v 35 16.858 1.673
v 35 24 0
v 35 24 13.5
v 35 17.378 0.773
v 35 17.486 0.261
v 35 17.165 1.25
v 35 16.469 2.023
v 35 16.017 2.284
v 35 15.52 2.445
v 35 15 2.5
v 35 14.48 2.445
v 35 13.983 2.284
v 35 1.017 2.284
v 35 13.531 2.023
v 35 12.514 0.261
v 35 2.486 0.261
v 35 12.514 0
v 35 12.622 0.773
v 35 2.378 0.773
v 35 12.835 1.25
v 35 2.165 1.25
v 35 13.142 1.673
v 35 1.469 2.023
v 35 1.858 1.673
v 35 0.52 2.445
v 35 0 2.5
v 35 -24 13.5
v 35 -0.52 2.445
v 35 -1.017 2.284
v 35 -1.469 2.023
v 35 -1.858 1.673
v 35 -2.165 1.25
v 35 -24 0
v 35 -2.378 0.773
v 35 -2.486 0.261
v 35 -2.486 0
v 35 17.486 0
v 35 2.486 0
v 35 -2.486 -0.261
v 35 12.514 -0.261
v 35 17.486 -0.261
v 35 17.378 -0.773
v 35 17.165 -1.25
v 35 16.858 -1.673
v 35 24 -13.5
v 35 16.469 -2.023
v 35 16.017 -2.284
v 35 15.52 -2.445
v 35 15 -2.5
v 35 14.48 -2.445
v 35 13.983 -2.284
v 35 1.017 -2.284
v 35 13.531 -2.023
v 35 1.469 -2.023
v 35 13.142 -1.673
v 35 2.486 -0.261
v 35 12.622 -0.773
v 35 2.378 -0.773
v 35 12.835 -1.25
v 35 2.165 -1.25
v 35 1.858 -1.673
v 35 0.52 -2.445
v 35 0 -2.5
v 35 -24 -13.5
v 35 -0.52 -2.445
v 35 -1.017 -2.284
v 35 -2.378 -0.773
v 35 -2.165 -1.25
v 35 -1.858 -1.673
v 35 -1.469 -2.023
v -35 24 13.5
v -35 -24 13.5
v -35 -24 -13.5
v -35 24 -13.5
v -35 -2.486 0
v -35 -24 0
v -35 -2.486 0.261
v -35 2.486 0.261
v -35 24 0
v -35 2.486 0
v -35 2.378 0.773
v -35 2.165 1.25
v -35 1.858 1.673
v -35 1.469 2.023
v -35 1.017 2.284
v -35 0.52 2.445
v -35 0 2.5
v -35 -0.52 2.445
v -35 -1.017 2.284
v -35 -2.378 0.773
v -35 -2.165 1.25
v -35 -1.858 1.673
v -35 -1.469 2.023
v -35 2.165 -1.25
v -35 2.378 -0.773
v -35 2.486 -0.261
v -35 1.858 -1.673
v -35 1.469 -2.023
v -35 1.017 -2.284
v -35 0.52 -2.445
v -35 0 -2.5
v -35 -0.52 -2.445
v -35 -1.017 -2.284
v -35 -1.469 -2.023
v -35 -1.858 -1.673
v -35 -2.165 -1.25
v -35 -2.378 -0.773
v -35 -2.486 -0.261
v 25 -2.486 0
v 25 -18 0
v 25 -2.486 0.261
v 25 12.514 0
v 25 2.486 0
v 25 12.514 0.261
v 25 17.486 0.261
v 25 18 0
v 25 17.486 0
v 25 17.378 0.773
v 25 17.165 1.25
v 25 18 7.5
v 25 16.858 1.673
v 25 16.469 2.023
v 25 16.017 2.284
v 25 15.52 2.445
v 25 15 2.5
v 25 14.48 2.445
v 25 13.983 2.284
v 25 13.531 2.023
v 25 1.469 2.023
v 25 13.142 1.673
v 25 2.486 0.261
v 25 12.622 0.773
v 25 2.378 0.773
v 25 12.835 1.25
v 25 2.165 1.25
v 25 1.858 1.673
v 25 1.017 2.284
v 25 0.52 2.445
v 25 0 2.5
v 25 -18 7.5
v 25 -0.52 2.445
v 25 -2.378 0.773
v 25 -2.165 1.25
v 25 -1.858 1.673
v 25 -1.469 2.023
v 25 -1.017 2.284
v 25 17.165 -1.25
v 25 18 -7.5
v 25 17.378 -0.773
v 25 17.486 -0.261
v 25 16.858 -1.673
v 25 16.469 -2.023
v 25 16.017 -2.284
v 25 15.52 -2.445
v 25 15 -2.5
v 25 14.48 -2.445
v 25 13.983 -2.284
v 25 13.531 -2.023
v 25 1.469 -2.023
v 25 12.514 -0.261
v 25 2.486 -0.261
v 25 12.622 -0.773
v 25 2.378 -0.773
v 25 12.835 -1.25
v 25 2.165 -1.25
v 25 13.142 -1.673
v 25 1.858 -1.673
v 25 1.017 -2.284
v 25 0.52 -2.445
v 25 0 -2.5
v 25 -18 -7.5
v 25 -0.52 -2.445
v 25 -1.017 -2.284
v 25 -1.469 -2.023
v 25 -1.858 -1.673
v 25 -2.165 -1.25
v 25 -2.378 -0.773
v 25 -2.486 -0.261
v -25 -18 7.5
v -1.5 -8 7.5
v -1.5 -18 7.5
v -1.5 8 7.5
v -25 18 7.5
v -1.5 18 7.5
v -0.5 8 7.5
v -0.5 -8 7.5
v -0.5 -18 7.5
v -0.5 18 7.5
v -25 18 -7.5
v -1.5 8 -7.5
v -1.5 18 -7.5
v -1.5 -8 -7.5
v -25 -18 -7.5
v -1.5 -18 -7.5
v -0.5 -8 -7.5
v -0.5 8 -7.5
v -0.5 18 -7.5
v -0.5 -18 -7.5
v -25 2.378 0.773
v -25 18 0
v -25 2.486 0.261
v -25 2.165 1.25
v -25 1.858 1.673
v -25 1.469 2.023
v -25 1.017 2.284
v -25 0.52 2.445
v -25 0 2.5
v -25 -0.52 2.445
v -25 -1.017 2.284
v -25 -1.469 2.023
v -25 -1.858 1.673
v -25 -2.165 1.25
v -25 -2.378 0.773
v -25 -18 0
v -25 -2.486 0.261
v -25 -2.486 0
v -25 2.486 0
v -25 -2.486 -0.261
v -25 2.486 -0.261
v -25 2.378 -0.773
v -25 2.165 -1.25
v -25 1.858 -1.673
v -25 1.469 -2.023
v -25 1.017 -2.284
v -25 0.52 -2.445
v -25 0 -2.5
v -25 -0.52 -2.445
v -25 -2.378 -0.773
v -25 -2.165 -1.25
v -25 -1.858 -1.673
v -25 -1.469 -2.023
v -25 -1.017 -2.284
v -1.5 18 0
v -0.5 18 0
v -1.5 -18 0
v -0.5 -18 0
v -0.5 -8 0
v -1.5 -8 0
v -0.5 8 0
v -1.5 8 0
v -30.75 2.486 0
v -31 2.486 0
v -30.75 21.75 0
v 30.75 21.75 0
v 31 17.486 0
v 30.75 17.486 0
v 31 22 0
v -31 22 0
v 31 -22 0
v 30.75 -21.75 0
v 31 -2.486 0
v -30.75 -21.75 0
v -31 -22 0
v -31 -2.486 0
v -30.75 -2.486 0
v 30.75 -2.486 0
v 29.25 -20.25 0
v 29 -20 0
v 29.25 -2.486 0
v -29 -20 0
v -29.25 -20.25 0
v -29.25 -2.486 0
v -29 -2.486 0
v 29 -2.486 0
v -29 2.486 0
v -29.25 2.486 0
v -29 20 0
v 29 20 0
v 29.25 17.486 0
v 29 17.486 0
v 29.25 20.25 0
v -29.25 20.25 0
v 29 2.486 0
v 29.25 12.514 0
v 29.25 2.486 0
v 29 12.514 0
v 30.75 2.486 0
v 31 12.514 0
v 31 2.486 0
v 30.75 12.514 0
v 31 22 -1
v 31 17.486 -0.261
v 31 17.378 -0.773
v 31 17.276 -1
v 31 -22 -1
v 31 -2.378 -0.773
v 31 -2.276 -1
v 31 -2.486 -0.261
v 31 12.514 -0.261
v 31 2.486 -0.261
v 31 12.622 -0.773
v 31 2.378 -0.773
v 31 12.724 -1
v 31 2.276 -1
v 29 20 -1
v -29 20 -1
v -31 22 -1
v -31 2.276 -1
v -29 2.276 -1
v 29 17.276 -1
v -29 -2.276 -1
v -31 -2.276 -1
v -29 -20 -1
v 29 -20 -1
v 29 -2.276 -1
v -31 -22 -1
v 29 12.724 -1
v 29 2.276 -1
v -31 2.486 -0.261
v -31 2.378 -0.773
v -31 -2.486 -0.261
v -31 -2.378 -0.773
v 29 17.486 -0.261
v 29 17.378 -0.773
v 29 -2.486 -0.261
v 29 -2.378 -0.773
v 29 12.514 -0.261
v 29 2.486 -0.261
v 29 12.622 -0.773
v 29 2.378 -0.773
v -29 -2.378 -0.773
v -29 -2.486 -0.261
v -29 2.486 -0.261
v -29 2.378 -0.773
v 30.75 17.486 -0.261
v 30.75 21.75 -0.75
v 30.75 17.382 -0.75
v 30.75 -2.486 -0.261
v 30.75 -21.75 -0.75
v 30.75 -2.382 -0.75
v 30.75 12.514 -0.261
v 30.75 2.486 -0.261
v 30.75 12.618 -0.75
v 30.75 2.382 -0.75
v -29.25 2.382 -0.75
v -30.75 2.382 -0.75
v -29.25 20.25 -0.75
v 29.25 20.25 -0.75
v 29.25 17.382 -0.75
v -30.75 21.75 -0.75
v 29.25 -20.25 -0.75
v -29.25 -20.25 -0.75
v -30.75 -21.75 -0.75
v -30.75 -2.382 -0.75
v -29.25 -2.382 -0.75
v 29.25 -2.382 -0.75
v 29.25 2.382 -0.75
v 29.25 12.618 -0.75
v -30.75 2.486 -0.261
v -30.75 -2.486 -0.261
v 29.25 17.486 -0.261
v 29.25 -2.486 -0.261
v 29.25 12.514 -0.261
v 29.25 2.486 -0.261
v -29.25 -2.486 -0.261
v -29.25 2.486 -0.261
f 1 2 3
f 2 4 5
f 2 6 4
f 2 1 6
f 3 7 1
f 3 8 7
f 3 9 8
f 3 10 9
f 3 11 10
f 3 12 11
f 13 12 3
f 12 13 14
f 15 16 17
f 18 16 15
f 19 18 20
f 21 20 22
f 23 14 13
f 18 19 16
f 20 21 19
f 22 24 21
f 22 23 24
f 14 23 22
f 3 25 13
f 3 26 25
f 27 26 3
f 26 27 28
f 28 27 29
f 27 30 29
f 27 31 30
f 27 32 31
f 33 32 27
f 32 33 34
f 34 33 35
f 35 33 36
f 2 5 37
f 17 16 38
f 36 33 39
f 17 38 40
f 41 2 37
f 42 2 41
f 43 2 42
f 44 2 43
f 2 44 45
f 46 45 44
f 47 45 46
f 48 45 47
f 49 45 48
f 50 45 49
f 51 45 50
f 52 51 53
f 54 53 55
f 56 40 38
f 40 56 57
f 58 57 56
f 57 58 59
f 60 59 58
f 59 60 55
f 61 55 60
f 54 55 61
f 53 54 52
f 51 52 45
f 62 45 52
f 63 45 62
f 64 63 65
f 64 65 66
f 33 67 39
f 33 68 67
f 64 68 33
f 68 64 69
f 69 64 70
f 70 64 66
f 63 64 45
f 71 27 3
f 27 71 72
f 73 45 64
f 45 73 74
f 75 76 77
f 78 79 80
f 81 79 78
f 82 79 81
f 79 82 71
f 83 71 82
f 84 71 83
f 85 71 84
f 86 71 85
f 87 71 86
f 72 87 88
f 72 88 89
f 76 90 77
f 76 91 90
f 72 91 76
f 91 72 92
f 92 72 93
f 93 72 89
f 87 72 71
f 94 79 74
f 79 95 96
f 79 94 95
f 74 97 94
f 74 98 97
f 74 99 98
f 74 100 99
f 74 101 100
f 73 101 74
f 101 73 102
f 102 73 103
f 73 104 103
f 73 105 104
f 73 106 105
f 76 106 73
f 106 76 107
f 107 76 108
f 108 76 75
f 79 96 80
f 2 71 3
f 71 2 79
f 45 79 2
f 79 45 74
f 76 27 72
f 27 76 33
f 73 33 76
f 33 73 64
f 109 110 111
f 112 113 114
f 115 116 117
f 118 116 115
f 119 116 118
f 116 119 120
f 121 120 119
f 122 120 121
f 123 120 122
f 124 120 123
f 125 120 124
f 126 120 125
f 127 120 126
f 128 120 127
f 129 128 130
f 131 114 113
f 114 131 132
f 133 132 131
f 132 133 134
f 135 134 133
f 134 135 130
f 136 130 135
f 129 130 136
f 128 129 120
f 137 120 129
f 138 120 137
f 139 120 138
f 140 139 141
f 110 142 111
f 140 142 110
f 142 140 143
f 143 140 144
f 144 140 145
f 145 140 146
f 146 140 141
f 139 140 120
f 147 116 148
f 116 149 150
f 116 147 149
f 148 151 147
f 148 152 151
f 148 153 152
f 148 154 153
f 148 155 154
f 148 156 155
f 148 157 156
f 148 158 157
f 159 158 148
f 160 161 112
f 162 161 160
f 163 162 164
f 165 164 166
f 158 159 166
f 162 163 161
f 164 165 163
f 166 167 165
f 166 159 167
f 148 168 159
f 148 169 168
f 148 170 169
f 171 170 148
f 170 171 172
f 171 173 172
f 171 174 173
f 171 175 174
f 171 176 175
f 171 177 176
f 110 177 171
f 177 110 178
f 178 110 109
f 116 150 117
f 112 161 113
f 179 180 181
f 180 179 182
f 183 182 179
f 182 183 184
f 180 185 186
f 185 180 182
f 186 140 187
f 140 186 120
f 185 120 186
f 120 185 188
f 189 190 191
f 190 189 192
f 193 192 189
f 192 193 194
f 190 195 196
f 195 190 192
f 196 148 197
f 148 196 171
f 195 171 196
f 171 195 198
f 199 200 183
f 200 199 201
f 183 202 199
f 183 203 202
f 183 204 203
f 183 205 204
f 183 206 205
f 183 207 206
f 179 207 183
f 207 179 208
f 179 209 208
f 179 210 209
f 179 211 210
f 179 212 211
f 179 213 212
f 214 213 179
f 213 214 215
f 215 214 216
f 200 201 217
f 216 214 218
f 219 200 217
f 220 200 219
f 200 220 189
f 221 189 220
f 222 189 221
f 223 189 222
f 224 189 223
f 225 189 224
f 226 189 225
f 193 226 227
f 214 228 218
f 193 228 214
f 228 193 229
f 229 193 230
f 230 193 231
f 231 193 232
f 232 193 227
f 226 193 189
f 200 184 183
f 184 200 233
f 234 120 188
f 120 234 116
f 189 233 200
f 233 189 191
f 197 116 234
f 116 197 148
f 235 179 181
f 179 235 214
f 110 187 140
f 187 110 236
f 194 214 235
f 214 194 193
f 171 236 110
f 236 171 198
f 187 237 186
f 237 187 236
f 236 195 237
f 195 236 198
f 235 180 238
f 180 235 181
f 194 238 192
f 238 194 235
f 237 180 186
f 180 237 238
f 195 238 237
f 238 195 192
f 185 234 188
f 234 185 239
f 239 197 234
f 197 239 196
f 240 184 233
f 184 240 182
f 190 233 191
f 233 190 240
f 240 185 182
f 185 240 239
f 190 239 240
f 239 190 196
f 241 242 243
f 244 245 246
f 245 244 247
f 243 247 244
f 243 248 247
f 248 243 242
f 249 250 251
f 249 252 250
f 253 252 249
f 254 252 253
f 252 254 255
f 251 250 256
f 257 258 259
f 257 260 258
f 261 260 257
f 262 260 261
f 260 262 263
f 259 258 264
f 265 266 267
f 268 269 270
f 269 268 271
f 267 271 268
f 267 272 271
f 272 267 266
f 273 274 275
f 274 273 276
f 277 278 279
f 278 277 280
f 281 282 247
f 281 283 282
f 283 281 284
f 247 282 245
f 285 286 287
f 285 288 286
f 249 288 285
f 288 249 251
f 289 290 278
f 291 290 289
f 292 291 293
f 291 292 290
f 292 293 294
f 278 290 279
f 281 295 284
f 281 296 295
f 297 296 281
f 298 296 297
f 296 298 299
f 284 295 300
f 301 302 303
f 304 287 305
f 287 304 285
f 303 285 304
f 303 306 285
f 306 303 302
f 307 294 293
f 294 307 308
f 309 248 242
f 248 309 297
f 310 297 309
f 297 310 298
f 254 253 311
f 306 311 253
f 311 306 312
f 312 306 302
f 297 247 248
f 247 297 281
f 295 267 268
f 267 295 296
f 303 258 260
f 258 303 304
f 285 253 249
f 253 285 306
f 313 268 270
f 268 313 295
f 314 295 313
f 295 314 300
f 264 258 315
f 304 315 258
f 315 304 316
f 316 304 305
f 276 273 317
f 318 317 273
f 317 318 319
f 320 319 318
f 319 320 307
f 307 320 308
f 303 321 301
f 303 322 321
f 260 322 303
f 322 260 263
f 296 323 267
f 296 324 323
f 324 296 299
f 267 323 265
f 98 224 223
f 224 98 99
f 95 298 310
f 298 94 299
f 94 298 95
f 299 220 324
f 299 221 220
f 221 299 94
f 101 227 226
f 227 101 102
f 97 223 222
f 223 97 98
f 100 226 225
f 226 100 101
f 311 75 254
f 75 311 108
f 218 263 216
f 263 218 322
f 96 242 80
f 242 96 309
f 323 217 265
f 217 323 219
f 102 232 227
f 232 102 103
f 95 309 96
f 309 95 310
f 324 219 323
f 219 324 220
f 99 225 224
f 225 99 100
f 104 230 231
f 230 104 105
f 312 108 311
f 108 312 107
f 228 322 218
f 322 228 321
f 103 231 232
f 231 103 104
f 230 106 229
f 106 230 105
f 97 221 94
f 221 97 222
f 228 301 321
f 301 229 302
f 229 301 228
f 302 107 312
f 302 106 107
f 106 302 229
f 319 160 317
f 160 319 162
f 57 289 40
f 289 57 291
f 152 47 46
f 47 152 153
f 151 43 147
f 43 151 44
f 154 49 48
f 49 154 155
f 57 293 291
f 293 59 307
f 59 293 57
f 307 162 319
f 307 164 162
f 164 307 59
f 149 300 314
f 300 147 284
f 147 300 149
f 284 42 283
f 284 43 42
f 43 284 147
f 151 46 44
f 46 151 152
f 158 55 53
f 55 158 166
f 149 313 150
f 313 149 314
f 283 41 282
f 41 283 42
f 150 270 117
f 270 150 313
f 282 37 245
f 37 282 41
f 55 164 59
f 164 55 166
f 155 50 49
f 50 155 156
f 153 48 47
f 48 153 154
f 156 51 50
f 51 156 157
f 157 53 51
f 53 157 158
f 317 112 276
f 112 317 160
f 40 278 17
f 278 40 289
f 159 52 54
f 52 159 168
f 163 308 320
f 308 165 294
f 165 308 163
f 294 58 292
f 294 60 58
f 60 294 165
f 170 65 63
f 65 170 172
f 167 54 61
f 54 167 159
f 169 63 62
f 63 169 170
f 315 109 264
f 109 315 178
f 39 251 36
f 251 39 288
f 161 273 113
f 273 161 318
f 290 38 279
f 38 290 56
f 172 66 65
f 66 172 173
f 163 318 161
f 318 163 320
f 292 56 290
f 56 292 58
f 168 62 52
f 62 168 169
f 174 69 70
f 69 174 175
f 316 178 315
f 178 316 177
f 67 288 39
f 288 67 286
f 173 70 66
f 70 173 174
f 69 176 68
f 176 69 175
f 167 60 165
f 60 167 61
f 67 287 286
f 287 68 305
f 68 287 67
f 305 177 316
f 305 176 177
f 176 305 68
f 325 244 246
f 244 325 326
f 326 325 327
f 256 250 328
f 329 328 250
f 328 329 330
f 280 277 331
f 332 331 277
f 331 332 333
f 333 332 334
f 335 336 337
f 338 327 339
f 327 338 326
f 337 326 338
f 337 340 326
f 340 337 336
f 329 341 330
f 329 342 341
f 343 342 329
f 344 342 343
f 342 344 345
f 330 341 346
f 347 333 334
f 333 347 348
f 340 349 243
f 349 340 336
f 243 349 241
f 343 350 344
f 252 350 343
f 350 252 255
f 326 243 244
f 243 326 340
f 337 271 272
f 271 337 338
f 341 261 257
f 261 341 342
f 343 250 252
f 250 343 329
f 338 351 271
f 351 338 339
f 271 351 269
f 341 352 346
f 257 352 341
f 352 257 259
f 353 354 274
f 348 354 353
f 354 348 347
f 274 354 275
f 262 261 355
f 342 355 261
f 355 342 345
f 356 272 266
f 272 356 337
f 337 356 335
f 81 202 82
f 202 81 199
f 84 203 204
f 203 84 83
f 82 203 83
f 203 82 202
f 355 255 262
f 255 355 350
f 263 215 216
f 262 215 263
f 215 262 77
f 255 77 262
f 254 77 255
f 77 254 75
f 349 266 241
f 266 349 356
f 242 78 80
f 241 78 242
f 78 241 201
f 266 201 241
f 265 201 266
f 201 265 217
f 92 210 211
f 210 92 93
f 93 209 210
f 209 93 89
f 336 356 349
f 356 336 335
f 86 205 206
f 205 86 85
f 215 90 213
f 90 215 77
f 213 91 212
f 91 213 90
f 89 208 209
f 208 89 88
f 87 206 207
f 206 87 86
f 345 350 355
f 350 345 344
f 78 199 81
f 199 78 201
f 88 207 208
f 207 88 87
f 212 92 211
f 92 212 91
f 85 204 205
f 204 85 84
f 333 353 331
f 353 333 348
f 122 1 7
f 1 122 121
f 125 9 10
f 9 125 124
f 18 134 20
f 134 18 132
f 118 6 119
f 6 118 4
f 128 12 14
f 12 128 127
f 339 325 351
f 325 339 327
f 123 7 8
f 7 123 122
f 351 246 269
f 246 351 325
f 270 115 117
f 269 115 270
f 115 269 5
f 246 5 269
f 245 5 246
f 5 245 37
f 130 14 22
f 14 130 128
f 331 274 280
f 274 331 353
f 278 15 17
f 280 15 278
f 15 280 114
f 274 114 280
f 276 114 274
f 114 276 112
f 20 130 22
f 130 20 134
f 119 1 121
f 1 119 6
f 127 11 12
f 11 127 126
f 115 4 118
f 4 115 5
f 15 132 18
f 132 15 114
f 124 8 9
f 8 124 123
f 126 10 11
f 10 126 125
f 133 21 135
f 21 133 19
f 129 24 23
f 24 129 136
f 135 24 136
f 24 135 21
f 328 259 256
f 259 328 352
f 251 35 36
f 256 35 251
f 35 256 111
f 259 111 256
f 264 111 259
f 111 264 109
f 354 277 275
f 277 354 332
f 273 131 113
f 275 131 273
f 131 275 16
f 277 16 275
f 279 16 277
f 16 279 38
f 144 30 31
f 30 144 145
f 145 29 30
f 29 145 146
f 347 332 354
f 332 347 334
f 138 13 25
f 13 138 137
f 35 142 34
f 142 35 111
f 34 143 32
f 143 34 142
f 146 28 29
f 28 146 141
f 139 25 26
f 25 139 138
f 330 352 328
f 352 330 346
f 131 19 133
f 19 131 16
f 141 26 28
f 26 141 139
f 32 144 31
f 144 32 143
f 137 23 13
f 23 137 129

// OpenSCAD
module sensor() {
    color("SandyBrown")
    cube([40,16,10], center = true);
}


module cavity() {
    color("SandyBrown")
    cube([40+10,16+20,10+5], center = true);
}

module shell() {
    color("SandyBrown")
    cube([40+10+20,16+20+12,10+5+12], center = true);
}

module pipe() {
    color("red")
    rotate([0,90,0])
    cylinder(h = 70, d = 5, center = true, $fn=30);
}

module boxDiff() {
    difference(){
        shell();
        cavity();
    }
}

module boxUni() {
    union(){
        boxDiff();
        translate([-1,-13,0]) cube([1,10,15], center = true);
        translate([-1,13,0]) cube([1,10,15], center = true);

    }
}

module botBox() {
    difference(){
        boxUni();
        translate([0,0,50/2]) cube([80,80,50], center = true);
    }
}

module topBox() {
    difference(){
        boxUni();
        translate([0,0,-50/2]) cube([80,80,50], center = true);
    }
}

module seal(d) {    
    union(){
        translate([0,(16+20+6)/2,0]) cube([(40+20)+d,d,d], center = true);
        translate([0,-(16+20+6)/2,0]) cube([(40+20)+d,d,d], center = true);
        translate([(40+20)/2,0,0]) cube([d,(16+20+6),d], center = true);
        translate([-(40+20)/2,0,0]) cube([d,(16+20+6),d], center = true);
        
    }
}

module botBoxSeal() {
    difference(){
        botBox();
        seal(2);
        translate([-20,0,0]) pipe(); //in
        translate([40,15,0]) pipe(); // out
        translate([20,0,0]) pipe(); // cable
        
    }
}

module topBoxSeal() {
    difference(){
        union(){
            topBox();
            seal(1.5);
            
        }
        translate([-20,0,0]) pipe(); //in
        translate([40,15,0]) pipe(); // out
        translate([20,0,0]) pipe(); // cable
    }
}
botBoxSeal();
topBoxSeal();
